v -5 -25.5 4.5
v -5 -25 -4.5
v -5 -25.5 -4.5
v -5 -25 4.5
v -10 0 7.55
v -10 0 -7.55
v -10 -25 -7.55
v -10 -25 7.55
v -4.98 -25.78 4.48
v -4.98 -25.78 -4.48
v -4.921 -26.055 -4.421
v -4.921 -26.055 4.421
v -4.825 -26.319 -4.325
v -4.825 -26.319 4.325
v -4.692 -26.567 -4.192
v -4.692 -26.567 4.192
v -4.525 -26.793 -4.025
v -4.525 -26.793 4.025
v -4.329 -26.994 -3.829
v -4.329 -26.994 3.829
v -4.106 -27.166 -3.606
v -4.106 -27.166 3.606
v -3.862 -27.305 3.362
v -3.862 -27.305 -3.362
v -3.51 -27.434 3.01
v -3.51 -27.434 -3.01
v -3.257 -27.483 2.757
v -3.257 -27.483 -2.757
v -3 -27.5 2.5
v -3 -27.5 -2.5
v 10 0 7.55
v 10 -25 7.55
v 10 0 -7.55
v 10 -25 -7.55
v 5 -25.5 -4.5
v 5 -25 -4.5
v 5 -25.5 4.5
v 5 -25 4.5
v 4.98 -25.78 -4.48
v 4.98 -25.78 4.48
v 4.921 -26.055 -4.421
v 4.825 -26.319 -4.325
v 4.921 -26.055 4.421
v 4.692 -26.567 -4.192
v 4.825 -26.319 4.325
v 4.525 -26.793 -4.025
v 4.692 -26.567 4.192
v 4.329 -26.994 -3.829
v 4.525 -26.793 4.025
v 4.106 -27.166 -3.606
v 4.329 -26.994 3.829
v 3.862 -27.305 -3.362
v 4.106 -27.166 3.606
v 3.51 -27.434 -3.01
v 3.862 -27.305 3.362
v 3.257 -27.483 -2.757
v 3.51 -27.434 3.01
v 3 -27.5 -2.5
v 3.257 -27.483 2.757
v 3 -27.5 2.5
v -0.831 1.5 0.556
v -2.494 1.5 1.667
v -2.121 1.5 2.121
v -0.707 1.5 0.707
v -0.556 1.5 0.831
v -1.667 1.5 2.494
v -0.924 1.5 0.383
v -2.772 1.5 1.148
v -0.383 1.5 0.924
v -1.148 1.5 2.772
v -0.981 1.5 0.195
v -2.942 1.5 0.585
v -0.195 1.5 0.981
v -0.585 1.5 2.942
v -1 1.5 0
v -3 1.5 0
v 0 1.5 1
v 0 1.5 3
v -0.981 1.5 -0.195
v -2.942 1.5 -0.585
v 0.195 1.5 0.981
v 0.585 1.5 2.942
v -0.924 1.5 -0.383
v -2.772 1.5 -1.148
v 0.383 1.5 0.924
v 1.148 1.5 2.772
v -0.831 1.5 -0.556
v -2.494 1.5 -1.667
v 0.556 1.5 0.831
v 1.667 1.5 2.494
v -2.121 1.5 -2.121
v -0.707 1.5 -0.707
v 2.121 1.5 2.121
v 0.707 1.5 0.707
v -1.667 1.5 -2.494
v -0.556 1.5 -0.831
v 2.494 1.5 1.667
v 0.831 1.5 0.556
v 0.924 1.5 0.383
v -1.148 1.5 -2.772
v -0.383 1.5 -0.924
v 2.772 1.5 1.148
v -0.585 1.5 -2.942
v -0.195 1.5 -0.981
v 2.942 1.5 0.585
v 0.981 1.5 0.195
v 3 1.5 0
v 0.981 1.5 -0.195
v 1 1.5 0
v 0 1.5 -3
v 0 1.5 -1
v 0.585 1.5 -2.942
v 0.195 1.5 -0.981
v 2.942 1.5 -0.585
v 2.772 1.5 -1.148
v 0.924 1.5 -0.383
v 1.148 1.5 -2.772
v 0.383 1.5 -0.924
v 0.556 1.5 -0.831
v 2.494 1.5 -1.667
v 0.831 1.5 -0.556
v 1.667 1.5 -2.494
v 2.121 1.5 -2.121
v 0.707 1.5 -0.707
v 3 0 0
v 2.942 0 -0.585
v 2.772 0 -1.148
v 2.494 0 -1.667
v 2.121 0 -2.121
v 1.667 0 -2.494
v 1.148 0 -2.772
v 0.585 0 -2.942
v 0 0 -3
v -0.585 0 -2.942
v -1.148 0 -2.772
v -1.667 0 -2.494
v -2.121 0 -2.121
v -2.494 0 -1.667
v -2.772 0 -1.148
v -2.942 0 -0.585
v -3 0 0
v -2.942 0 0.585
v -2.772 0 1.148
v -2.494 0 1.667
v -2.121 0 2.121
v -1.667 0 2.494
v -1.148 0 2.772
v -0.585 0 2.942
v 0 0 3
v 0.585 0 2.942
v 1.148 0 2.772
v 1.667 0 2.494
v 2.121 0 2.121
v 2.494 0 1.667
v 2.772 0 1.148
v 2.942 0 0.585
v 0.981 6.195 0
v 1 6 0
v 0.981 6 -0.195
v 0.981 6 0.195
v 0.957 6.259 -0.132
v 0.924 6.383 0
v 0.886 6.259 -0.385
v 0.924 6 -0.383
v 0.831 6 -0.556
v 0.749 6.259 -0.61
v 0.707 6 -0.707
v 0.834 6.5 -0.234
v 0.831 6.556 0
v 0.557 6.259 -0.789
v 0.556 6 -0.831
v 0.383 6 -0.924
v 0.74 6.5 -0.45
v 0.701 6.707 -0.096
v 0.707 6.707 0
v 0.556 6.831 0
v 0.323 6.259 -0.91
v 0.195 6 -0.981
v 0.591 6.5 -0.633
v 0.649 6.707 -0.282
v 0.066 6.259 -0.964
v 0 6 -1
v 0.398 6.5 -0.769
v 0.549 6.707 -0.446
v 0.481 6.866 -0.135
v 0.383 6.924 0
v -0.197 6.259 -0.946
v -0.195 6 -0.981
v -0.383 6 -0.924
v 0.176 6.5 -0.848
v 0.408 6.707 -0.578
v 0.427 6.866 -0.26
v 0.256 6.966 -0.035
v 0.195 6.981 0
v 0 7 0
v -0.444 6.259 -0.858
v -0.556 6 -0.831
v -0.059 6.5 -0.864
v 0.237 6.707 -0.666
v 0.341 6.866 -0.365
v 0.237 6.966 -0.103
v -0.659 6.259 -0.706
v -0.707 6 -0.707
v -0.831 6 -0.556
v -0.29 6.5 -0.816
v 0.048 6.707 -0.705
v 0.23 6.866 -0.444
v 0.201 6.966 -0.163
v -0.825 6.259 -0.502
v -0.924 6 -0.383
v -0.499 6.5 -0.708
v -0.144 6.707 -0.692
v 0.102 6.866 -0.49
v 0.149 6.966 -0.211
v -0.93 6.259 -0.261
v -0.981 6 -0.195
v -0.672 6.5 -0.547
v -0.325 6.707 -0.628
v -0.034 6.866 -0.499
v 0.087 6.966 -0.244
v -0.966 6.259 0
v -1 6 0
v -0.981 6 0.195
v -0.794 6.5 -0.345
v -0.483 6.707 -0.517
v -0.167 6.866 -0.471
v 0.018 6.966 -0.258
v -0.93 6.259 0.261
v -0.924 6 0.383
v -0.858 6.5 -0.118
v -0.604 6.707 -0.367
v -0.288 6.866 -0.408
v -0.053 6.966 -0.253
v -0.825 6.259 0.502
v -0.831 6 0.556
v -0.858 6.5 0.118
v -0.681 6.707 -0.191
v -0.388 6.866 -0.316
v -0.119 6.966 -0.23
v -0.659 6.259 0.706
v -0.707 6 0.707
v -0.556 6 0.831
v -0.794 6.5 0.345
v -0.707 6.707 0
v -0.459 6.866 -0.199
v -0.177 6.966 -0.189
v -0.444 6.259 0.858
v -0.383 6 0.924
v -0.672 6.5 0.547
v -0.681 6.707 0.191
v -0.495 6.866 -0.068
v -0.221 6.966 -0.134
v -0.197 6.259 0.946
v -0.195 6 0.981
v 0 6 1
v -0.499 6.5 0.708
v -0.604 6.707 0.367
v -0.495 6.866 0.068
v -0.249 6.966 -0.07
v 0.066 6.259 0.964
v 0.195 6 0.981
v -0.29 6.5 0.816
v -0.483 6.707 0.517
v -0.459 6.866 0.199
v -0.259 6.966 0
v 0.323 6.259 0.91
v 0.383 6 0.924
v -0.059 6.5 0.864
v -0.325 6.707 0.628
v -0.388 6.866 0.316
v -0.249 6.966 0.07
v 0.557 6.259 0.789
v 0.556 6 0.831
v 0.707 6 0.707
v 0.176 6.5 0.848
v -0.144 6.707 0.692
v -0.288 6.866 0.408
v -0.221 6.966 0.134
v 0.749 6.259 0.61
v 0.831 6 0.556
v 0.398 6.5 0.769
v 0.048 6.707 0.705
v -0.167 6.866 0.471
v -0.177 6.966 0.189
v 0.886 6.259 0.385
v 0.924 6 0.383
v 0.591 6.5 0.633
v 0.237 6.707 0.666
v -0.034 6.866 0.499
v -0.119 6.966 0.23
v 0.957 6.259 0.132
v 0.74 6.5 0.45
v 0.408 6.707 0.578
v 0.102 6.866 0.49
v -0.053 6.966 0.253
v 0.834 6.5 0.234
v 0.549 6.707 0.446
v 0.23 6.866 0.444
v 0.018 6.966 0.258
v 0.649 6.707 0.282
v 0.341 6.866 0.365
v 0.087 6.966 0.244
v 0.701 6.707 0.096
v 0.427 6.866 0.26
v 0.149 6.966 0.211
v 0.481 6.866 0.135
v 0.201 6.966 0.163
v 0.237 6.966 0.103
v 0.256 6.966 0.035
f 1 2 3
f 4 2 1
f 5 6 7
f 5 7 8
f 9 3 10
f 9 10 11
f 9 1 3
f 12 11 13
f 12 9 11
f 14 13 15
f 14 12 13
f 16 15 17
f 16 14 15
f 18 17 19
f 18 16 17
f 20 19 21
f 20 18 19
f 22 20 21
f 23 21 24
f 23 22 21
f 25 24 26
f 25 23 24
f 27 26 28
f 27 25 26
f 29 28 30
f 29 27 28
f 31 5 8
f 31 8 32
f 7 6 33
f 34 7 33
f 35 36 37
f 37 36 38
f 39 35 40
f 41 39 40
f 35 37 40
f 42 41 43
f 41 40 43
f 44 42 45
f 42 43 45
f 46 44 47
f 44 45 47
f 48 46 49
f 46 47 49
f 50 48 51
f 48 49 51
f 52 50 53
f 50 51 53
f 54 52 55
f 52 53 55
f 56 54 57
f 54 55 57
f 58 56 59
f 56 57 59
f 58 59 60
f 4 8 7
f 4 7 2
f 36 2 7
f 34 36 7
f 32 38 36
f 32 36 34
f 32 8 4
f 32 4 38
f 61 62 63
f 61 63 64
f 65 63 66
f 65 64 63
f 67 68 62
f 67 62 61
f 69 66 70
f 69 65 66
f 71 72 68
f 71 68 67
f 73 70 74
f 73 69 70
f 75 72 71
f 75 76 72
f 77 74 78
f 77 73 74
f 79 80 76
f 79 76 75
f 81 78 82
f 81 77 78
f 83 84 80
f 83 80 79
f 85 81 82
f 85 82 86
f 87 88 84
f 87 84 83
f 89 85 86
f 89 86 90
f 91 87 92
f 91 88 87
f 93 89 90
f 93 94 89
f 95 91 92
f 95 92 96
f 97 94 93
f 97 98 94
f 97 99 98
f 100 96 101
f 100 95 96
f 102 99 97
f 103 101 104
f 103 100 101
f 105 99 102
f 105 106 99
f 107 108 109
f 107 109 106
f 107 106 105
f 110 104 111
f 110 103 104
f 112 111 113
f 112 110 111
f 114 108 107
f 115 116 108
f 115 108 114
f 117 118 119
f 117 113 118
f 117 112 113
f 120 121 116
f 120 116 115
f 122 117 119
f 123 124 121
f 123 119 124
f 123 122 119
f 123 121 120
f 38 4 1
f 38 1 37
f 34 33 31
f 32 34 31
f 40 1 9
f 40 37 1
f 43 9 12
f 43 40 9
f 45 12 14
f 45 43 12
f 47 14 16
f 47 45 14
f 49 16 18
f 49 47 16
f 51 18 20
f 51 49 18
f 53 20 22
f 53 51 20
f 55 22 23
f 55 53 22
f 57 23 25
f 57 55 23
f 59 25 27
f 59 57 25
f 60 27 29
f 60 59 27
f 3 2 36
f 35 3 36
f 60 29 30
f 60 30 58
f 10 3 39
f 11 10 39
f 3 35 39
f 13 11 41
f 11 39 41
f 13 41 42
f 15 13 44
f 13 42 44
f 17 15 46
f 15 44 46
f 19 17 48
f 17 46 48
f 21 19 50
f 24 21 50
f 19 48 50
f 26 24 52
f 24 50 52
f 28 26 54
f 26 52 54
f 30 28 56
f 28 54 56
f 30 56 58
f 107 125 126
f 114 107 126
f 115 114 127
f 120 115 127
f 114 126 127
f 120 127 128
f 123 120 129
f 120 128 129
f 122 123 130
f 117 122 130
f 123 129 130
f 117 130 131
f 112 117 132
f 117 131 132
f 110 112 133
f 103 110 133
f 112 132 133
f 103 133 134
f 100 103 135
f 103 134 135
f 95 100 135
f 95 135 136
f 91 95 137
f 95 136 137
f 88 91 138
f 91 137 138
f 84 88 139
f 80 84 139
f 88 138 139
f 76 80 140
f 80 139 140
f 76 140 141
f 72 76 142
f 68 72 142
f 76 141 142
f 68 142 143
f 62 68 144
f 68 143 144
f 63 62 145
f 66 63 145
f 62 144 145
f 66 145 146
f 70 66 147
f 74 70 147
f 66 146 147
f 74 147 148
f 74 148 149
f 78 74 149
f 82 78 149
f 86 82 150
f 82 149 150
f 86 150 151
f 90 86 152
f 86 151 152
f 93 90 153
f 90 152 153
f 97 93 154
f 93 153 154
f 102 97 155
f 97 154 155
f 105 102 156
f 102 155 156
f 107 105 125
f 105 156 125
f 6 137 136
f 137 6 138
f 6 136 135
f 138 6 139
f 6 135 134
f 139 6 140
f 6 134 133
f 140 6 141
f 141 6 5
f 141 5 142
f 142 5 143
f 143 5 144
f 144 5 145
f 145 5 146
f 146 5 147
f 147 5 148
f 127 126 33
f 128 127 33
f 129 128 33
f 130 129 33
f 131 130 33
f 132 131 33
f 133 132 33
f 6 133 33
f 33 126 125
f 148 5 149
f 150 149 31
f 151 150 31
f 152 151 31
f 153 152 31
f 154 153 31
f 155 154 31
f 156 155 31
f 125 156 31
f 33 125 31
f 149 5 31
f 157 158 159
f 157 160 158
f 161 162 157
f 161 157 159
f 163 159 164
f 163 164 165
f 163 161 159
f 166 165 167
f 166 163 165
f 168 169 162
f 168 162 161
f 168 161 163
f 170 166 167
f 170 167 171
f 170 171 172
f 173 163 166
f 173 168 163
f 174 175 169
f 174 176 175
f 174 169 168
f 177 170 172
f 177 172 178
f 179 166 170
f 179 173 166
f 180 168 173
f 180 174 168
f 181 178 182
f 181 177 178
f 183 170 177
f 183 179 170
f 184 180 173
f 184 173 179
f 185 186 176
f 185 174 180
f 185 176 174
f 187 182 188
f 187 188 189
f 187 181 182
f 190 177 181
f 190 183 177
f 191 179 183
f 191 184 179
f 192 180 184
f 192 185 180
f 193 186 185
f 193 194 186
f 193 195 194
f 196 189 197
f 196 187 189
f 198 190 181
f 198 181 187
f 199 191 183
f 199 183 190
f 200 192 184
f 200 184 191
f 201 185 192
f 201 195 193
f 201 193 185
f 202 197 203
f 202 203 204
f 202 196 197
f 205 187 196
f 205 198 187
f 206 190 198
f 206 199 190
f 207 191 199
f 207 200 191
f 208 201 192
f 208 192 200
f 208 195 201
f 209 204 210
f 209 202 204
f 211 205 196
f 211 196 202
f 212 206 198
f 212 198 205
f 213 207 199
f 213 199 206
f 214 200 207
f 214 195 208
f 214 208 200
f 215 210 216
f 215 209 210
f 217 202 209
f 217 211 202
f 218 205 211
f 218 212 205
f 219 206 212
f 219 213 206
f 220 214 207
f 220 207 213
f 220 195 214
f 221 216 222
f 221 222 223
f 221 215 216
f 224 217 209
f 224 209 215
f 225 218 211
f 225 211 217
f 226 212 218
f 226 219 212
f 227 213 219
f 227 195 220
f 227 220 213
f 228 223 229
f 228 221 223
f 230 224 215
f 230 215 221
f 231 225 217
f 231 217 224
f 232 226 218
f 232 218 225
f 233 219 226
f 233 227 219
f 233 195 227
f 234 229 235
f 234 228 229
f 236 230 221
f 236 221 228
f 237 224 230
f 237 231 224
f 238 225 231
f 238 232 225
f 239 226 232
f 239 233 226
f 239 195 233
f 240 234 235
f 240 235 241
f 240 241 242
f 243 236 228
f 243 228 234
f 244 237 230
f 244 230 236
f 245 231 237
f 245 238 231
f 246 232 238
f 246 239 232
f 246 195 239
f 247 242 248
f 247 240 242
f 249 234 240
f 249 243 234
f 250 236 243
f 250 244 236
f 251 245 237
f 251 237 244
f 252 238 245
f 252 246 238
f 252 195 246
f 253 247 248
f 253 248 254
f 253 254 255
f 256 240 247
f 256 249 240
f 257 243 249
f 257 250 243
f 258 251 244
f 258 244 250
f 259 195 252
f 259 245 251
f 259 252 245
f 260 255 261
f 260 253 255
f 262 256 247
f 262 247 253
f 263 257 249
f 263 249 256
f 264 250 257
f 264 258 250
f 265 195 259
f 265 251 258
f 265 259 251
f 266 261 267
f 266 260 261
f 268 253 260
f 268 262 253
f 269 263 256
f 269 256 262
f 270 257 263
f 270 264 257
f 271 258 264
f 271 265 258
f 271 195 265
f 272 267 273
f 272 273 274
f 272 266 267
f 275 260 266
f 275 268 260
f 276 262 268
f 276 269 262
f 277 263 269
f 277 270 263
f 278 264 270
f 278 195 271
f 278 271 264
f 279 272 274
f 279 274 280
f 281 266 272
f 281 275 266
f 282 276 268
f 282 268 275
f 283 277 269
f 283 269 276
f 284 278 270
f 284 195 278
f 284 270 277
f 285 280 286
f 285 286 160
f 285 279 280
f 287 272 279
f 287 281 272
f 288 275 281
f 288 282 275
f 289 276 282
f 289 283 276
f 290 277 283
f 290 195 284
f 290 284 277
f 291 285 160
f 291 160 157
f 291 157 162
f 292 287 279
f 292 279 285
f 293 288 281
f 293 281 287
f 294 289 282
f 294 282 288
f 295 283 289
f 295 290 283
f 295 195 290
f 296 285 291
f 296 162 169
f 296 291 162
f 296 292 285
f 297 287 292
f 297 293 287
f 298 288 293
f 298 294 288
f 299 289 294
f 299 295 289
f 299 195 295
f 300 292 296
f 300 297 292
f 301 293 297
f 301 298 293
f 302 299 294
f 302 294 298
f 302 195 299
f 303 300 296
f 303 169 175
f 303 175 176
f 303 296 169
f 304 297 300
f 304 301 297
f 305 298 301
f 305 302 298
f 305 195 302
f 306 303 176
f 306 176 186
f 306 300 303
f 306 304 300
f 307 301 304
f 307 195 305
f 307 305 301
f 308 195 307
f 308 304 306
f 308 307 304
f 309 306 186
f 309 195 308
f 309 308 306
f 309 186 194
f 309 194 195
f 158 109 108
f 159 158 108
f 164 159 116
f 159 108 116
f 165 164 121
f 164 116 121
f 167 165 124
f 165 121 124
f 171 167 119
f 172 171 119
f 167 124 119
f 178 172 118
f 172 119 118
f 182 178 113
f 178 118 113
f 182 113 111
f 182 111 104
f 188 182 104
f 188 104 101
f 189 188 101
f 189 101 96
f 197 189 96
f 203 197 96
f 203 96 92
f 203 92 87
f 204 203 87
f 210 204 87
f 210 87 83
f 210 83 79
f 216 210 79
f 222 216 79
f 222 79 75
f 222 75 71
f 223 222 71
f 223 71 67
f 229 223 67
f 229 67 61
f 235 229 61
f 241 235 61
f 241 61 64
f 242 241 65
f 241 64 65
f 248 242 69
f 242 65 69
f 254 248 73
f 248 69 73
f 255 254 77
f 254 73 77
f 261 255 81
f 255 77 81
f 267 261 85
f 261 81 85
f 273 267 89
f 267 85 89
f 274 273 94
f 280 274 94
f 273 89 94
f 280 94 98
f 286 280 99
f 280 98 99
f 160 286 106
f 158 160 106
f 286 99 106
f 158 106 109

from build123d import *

# Parameters (mm, degrees)
F0_W      = 20
F0_H      = 15.1
F1_DEPTH  = 25
F3_R      = 3
F3_R_2    = 1
F4_DEPTH  = 1.5
F4_FACE_R = 1
F5_DEPTH  = 7
F6_R      = 1
F8_W      = 10
F8_H      = 9
F9_DEPTH  = 2.5
F10_R     = 2


with BuildPart() as f1:
    # F0 (on Front) → F1 (new body)
    with BuildSketch(Plane.XZ):
        Rectangle(F0_W, F0_H)
    extrude(amount=F1_DEPTH)

    # F3 (on offset) → F4 (join)
    with BuildSketch(Plane(origin=(0, 0, 0), x_dir=(1, 0, 0), z_dir=(0, 1, 0))):
        Circle(F3_R)
        Circle(F3_R_2, mode=Mode.SUBTRACT)
    extrude(amount=F4_DEPTH)

    # F4_face (on face) → F5 (join)
    with BuildSketch(Plane(origin=(0, 0, 0), x_dir=(1, 0, 0), z_dir=(0, 1, 0))):
        Circle(F4_FACE_R)
    extrude(amount=F5_DEPTH)

    # F6
    f6_edges = [f1.edges().sort_by_distance(p)[0] for p in [
        (-1, 7, 0),
    ]]
    fillet(f6_edges, radius=F6_R)

    # F8 (on offset) → F9 (join)
    with BuildSketch(Plane.XZ.offset(25)):
        Rectangle(F8_W, F8_H)
    extrude(amount=F9_DEPTH)

    # F10
    f10_edges = [f1.edges().sort_by_distance(p)[0] for p in [
        (0, -27.5, 4.5),
        (5, -27.5, 0),
        (-5, -27.5, 0),
        (0, -27.5, -4.5),
    ]]
    fillet(f10_edges, radius=F10_R)


solid = f1.part
